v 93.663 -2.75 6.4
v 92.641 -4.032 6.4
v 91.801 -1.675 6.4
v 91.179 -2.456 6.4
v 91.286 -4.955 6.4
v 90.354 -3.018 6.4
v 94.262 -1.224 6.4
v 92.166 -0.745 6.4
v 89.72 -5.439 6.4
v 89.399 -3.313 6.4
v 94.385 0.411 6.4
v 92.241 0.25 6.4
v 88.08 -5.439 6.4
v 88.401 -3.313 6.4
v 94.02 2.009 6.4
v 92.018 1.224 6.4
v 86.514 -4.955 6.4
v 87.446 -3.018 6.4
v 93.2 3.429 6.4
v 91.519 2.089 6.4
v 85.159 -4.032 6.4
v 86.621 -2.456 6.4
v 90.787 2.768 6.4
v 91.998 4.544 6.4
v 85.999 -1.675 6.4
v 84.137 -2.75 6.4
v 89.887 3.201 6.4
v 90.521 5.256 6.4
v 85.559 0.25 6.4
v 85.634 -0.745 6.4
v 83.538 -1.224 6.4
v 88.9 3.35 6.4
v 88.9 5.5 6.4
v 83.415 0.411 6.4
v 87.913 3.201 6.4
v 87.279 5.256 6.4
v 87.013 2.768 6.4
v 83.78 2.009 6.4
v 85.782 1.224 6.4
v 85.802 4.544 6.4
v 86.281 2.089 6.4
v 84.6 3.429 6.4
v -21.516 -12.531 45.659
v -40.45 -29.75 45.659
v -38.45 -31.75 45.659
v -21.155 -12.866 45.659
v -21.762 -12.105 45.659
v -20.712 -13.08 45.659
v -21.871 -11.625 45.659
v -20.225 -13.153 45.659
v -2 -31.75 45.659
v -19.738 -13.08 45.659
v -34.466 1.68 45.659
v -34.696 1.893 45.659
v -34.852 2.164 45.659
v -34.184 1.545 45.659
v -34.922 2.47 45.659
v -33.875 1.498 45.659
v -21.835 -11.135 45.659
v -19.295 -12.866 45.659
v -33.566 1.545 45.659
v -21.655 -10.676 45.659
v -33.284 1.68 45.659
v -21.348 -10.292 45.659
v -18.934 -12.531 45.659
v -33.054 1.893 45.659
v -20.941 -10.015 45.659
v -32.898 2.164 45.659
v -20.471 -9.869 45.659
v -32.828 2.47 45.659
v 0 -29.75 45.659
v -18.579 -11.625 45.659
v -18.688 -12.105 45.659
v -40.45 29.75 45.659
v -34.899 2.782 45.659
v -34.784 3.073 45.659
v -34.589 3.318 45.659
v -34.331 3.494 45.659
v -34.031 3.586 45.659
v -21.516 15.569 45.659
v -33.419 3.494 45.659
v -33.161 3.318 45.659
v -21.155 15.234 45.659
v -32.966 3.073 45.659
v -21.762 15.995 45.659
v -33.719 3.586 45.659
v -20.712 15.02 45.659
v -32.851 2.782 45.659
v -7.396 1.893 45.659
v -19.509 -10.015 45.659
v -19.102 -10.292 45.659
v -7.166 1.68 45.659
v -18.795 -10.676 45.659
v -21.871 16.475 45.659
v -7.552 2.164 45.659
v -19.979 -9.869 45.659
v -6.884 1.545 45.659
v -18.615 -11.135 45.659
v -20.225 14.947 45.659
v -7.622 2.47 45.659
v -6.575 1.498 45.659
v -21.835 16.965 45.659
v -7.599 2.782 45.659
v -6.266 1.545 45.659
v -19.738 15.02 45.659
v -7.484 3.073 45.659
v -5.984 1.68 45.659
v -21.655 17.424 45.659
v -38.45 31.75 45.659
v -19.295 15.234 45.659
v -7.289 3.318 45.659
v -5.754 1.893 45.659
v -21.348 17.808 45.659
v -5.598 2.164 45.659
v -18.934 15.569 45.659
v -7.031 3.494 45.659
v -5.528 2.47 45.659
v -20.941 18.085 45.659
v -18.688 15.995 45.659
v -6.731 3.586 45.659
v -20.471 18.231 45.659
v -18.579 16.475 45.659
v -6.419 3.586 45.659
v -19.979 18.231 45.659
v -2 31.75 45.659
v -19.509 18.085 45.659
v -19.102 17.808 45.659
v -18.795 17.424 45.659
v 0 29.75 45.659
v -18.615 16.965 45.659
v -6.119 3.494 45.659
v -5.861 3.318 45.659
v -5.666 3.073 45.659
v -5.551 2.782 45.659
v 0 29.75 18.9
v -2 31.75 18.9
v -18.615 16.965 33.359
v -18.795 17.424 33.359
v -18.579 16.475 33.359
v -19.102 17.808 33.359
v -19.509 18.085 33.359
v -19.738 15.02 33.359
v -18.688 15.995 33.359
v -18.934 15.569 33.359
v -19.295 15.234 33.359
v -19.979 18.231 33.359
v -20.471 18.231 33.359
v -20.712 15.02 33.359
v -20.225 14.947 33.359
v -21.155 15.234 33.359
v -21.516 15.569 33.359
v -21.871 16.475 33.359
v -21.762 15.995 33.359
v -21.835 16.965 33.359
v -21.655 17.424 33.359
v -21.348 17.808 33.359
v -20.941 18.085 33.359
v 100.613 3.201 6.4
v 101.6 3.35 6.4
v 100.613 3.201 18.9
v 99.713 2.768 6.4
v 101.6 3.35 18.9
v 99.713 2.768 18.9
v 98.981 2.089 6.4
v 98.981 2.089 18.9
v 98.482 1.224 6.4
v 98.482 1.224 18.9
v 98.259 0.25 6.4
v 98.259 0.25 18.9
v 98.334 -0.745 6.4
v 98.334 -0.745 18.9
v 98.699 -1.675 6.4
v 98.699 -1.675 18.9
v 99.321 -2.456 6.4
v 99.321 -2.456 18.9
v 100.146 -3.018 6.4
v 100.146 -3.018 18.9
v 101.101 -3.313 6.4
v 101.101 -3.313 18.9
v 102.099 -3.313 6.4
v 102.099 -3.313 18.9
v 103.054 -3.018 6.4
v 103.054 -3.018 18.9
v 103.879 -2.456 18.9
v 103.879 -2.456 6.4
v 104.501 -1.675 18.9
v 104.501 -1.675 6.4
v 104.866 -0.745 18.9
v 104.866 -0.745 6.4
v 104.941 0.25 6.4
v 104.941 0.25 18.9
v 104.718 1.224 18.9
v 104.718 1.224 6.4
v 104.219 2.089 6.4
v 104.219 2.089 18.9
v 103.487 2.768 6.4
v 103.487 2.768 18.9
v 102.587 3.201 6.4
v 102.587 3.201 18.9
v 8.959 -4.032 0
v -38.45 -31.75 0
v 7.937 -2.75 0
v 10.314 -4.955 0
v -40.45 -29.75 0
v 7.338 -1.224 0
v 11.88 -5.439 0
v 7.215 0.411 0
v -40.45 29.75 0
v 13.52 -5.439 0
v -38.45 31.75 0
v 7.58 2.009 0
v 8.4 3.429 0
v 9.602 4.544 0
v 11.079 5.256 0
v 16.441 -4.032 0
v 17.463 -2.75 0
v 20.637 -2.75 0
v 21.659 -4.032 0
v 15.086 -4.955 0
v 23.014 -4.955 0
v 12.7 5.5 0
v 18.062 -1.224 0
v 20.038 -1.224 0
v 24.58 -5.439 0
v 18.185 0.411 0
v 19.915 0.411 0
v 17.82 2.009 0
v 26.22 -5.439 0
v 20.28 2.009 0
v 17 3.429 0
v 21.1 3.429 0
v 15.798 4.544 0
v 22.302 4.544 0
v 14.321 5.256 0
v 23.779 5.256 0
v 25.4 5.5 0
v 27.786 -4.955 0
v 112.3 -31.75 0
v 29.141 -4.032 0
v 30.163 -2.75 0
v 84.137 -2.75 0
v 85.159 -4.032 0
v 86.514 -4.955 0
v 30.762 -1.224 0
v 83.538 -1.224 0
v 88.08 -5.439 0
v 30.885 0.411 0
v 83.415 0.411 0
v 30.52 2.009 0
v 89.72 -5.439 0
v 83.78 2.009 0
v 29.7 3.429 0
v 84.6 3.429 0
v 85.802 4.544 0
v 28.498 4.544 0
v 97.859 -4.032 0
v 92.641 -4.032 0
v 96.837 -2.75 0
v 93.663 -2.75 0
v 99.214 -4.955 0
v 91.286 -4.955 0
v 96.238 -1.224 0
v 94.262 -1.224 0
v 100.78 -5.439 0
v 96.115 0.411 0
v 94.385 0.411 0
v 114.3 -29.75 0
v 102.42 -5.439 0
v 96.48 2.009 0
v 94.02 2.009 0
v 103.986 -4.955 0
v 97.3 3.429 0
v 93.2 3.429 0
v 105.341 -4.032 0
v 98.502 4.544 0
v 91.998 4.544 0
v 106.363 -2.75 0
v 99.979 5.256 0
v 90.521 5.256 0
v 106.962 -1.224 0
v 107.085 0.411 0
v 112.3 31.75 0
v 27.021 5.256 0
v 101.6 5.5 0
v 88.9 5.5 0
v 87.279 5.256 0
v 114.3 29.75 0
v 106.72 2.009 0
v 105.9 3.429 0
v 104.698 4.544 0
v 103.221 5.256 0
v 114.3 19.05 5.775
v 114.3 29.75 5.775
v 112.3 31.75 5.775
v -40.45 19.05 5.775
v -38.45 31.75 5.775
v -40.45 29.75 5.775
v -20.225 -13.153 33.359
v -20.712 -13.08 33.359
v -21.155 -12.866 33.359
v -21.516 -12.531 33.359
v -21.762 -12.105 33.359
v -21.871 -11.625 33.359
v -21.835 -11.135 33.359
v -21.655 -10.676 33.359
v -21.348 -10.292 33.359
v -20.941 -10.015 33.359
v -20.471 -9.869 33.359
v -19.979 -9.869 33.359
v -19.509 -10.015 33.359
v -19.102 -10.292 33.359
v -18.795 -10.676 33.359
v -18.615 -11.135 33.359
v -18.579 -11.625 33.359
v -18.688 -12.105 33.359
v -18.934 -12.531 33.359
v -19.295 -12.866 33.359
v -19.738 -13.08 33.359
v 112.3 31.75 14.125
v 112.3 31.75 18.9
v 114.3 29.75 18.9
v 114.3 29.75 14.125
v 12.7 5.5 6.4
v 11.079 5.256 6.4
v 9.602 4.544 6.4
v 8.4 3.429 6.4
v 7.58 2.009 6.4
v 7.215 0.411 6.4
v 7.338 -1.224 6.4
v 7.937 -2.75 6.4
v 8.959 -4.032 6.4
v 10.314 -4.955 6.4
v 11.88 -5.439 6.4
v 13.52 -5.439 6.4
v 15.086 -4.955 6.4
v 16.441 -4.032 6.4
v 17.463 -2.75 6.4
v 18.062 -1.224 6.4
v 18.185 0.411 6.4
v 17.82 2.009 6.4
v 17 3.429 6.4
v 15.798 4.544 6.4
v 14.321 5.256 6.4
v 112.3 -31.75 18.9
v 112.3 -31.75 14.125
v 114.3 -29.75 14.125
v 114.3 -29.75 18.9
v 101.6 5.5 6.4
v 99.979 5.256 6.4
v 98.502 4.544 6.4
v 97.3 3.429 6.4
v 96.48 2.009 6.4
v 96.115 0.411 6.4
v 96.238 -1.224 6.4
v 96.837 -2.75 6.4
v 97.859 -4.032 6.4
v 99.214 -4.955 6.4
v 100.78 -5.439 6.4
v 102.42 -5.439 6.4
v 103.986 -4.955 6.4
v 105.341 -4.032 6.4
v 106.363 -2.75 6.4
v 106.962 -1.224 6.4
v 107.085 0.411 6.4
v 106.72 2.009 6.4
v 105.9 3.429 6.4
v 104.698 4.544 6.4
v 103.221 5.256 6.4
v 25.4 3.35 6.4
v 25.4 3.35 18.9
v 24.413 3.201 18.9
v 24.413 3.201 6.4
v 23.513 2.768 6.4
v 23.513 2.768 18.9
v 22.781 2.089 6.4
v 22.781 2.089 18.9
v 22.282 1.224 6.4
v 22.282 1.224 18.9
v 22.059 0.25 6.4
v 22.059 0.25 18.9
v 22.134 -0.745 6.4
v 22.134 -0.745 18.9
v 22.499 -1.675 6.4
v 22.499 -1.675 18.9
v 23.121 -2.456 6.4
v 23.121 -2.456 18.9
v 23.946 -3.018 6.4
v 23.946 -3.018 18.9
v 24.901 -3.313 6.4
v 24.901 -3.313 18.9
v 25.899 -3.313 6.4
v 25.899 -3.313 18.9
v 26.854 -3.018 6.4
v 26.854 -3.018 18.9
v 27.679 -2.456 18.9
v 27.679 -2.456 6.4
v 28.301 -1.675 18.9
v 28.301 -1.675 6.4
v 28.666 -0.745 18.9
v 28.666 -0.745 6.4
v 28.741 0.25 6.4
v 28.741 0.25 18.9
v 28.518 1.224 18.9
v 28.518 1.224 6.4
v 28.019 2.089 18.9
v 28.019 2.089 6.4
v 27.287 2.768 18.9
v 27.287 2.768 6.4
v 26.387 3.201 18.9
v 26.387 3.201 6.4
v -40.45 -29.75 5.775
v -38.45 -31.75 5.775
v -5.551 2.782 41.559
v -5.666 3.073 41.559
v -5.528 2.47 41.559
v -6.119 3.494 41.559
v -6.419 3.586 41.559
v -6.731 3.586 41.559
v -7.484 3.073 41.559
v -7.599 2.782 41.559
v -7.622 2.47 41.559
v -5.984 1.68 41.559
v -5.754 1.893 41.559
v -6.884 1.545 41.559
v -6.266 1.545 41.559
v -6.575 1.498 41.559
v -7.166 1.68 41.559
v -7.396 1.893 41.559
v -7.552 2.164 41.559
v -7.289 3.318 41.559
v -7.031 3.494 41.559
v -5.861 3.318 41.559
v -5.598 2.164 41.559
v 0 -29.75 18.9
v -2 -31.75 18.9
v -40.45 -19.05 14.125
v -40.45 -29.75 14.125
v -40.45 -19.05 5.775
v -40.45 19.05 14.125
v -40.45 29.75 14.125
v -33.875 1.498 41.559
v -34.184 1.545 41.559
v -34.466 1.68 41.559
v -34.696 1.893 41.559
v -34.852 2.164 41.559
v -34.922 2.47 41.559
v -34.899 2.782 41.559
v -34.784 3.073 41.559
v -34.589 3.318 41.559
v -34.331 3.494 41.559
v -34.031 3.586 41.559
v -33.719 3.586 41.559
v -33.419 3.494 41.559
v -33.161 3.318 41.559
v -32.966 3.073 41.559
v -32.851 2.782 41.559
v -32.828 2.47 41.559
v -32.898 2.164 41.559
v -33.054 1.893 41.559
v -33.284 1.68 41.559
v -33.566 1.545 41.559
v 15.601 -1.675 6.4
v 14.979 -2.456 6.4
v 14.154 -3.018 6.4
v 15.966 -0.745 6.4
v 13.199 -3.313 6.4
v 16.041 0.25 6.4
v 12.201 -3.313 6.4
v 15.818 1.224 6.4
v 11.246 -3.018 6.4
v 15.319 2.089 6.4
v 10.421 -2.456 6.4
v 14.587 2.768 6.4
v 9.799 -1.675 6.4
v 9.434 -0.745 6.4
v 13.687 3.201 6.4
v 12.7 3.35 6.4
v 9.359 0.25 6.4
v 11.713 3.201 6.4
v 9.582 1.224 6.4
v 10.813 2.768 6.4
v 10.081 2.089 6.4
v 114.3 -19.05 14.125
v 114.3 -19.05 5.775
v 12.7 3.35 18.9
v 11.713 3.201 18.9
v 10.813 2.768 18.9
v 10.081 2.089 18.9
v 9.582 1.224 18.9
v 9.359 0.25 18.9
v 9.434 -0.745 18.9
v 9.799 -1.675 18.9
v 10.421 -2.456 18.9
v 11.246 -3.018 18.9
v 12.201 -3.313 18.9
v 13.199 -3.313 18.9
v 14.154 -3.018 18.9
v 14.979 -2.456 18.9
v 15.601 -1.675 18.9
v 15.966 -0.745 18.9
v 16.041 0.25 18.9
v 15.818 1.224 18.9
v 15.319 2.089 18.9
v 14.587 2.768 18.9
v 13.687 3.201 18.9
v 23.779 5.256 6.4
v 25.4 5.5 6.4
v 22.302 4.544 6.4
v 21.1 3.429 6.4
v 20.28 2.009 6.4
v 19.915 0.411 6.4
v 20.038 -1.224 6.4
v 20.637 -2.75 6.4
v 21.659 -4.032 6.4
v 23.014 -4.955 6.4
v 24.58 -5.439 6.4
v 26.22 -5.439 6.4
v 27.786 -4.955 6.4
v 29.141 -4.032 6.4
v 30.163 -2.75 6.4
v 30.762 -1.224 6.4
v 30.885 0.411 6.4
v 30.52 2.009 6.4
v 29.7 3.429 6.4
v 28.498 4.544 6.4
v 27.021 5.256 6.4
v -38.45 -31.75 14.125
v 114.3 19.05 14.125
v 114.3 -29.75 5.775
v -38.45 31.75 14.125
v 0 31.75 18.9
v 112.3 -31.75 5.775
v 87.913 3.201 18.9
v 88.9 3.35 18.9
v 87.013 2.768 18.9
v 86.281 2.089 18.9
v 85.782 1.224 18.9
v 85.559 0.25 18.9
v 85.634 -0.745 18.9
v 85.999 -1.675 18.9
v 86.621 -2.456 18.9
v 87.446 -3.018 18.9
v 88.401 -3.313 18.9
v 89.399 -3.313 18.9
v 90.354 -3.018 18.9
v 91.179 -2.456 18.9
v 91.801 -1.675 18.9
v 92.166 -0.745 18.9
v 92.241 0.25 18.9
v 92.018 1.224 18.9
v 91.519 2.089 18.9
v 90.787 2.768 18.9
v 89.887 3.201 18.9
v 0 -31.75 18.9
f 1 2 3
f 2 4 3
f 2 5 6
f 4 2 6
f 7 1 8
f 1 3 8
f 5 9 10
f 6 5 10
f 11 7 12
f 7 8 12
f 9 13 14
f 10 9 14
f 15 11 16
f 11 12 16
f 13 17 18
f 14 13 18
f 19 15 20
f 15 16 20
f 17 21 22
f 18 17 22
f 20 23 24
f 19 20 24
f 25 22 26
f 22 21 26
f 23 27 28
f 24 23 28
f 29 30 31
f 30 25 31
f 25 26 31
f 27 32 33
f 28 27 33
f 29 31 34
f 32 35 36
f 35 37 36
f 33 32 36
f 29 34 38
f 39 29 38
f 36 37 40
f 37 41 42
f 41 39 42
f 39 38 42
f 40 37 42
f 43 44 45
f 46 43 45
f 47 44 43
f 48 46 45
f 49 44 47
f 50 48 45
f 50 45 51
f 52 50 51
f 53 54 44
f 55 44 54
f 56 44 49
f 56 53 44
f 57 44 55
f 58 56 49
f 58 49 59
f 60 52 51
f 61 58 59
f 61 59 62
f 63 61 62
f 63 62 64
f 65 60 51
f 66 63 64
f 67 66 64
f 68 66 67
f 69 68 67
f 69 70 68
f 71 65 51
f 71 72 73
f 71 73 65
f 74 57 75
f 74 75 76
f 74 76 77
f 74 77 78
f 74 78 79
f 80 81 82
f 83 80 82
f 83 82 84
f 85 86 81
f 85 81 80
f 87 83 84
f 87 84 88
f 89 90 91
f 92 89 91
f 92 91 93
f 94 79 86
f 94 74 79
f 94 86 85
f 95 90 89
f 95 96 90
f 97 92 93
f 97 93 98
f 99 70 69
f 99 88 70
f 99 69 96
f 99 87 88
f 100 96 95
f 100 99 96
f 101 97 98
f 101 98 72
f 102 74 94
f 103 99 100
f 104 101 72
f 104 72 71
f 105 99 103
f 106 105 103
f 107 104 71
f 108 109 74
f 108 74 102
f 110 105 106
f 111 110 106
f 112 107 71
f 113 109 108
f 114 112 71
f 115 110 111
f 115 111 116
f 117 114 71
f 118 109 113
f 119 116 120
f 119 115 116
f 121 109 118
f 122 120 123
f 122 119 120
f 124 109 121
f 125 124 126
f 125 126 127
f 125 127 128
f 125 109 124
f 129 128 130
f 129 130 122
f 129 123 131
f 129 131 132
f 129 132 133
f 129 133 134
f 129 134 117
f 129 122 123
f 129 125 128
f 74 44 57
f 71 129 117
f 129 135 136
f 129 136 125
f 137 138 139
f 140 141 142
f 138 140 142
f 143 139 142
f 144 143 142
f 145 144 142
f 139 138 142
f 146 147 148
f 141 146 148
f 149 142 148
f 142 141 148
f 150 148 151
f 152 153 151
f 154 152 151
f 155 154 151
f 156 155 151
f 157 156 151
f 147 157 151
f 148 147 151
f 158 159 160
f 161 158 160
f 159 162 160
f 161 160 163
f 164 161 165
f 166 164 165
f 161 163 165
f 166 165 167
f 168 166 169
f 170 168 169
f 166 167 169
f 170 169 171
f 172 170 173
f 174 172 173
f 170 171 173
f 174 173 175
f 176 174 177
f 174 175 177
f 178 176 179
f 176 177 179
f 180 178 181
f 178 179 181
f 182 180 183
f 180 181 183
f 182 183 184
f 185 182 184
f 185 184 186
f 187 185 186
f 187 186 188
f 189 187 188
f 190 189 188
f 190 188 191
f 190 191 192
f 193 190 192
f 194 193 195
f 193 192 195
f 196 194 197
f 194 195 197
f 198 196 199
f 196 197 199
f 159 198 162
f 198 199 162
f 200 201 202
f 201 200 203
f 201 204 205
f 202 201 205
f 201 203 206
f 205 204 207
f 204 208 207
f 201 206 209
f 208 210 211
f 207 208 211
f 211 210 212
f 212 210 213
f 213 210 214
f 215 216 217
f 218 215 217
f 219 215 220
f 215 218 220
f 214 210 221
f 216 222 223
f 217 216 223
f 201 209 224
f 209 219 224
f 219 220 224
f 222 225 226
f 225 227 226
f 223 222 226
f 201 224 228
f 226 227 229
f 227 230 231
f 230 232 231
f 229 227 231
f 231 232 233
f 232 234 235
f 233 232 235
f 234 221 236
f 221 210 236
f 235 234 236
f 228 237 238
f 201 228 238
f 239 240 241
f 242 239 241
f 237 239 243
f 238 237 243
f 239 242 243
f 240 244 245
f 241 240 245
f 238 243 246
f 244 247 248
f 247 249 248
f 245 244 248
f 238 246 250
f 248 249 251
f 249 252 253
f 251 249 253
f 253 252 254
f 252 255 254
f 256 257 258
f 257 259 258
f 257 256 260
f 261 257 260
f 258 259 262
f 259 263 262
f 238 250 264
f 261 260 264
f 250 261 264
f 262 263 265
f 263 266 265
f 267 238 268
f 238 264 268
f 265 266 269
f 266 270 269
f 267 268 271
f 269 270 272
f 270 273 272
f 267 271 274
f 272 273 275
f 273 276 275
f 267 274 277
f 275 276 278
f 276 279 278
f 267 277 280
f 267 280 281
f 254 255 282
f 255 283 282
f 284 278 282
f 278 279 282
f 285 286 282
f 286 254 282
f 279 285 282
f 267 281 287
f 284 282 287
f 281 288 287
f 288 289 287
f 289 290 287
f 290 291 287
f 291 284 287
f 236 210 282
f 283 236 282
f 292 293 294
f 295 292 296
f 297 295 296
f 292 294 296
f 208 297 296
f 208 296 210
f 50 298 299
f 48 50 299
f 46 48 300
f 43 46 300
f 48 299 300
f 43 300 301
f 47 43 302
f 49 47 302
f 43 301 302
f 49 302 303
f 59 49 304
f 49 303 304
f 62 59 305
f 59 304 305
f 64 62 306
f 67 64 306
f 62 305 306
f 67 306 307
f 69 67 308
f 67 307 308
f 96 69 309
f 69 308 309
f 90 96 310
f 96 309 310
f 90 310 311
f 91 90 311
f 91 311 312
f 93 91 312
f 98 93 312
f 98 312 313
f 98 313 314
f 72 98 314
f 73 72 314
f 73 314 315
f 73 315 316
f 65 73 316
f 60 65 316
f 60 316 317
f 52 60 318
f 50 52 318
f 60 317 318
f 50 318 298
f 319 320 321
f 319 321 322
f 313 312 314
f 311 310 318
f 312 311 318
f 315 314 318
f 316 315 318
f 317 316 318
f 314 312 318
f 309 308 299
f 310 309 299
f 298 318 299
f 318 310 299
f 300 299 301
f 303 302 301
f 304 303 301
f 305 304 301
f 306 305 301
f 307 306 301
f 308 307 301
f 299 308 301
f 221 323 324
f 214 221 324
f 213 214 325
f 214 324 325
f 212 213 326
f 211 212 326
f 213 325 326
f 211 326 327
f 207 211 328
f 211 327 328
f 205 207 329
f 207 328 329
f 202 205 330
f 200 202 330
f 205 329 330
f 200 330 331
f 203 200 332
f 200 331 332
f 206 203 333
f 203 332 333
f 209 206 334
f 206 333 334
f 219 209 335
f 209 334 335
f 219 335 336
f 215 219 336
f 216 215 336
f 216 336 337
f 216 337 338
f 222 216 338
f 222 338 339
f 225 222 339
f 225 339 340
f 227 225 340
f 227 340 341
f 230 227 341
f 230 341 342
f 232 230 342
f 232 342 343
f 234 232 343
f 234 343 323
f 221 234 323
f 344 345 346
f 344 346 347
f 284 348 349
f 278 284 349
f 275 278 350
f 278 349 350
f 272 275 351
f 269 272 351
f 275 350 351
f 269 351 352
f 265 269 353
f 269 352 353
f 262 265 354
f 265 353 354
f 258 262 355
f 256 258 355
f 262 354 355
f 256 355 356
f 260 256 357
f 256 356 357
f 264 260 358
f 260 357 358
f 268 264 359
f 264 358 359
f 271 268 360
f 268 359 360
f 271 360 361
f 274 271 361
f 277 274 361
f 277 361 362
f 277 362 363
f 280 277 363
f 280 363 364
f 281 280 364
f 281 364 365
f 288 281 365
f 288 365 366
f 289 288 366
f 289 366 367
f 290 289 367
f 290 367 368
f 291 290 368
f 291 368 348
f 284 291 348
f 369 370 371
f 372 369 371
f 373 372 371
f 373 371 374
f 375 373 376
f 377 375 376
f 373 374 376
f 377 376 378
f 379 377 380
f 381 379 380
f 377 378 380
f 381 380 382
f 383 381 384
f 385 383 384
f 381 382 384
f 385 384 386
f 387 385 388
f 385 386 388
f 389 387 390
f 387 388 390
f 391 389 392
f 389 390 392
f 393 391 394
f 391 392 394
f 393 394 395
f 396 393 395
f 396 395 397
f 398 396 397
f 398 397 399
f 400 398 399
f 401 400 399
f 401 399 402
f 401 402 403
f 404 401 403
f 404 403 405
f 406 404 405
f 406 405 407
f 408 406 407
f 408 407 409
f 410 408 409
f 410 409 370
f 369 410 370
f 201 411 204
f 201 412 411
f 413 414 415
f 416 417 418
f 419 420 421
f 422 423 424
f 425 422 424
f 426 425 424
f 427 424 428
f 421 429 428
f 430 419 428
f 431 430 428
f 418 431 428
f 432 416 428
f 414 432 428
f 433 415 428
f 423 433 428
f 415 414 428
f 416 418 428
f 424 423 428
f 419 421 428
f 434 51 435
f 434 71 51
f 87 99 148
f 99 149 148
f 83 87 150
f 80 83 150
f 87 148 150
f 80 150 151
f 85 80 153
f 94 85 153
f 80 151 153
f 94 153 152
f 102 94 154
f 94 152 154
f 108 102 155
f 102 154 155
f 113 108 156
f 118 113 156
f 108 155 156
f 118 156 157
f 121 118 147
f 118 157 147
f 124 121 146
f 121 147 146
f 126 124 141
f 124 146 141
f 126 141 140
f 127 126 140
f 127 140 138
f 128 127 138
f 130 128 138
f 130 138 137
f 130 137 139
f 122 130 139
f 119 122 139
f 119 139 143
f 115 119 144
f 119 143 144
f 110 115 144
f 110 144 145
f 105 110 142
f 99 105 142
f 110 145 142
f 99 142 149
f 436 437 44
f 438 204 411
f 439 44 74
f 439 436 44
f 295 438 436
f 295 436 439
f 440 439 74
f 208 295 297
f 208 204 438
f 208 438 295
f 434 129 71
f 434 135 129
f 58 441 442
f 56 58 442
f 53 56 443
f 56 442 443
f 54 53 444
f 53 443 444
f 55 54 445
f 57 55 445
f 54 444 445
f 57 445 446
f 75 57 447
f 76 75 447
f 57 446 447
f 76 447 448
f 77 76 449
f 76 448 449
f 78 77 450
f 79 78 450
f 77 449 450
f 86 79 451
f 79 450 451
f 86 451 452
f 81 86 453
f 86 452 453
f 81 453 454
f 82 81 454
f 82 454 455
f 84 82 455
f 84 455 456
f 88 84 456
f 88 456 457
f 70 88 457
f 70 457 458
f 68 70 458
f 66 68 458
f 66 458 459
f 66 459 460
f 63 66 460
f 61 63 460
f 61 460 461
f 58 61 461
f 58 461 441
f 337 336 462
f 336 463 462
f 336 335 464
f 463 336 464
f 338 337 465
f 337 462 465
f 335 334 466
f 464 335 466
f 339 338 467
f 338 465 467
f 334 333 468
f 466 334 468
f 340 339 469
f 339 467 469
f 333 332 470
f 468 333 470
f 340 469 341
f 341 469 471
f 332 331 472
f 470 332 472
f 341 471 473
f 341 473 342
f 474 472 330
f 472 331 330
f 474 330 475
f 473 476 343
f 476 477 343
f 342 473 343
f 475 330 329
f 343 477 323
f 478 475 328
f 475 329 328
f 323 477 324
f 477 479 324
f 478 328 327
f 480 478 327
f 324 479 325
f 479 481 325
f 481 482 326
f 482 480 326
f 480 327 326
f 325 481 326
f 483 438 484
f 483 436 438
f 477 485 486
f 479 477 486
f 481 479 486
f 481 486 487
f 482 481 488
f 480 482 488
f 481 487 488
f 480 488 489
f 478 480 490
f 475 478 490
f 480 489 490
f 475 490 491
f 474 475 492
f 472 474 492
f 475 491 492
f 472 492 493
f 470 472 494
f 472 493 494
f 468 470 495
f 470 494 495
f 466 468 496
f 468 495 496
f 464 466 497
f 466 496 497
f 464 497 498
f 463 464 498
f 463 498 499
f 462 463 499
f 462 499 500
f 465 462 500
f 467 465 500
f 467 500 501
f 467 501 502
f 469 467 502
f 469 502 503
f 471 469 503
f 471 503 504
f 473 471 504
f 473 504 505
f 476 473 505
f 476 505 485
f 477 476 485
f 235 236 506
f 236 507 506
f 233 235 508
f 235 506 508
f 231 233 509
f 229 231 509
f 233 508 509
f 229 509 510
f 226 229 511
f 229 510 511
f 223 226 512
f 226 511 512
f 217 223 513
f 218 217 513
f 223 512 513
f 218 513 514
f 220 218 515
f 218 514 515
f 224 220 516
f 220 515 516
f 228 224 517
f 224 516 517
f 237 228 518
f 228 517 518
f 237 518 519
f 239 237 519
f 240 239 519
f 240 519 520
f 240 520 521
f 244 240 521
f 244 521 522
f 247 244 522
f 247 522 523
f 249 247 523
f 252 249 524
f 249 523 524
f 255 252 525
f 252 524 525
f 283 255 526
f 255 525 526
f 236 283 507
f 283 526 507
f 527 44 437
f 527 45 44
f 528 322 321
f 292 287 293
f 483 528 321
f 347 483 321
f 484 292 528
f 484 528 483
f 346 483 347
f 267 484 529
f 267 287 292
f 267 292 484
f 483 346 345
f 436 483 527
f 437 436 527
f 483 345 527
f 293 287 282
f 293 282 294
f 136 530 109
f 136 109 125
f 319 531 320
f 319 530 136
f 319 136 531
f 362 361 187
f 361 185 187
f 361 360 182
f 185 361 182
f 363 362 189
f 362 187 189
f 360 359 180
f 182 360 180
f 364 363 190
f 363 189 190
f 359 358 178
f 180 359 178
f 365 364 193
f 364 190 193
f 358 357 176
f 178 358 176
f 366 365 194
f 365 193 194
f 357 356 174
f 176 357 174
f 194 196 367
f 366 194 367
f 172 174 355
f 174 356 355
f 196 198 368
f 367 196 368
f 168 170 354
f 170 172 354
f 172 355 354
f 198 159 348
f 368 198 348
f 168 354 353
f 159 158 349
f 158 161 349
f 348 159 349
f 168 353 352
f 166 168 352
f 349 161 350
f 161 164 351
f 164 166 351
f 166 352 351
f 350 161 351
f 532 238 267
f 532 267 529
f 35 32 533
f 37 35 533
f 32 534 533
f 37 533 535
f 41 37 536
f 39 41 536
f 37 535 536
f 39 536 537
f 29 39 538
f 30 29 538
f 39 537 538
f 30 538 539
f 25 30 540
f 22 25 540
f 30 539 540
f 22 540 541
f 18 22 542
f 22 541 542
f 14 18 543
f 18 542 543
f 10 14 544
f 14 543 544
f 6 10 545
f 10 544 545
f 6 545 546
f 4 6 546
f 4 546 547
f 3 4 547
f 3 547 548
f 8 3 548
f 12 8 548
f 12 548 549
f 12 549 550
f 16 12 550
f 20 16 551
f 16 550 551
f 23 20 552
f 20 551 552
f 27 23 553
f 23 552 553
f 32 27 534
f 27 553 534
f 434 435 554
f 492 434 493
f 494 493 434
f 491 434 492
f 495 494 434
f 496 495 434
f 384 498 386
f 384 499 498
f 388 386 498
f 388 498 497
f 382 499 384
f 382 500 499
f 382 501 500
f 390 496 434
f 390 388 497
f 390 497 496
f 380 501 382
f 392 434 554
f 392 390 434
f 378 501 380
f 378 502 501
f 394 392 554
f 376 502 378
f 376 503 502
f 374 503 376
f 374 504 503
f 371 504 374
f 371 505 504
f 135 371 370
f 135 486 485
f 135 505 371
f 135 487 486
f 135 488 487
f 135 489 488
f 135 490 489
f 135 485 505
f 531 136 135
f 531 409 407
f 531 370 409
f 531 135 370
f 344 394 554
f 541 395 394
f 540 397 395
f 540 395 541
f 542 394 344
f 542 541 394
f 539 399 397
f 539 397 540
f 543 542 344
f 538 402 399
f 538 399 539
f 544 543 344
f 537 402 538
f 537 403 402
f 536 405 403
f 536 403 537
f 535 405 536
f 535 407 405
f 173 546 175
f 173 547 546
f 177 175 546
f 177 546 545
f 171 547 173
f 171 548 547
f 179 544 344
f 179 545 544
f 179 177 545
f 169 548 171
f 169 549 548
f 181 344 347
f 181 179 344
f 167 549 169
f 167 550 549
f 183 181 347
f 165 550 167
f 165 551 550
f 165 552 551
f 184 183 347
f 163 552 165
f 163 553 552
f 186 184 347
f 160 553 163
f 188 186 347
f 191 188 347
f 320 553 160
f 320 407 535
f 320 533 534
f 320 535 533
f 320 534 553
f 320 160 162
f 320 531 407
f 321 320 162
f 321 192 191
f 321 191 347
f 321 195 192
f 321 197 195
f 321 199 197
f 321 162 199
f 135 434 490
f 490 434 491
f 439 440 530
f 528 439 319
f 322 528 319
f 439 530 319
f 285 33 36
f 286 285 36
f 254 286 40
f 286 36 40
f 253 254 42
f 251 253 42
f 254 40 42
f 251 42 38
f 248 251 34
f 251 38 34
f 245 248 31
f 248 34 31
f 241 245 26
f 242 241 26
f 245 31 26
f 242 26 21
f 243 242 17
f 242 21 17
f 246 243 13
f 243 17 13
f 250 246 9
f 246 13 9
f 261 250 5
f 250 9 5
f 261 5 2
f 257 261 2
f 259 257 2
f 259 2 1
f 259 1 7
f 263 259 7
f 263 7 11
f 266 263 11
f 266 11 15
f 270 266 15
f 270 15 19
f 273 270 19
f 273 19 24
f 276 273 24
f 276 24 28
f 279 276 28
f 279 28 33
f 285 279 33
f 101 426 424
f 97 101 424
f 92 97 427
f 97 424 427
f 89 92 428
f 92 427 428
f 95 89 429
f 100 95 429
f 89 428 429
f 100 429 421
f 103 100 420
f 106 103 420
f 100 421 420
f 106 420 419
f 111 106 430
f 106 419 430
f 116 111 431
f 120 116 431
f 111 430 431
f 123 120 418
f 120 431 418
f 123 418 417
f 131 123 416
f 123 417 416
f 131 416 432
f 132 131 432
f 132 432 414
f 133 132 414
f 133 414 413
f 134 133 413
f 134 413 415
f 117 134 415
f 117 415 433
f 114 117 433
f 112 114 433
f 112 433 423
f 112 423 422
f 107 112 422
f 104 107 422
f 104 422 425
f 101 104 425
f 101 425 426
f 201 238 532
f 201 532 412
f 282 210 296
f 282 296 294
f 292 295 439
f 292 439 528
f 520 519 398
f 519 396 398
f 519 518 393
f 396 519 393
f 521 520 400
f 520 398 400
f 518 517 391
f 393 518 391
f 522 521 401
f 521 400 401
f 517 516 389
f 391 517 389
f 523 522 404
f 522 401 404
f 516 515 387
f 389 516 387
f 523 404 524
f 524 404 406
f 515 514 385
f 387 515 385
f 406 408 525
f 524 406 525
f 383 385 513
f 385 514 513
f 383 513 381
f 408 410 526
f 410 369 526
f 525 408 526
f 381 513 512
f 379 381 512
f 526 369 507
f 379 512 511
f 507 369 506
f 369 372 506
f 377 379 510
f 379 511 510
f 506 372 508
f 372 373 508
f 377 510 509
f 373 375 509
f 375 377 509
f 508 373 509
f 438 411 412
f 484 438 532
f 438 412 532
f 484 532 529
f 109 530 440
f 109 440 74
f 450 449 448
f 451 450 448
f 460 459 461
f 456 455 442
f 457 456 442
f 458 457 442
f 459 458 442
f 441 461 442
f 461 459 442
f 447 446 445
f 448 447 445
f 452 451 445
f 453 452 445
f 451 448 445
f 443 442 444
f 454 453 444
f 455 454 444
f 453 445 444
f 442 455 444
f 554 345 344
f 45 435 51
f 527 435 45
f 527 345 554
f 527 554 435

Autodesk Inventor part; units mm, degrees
ref_plane "YZ Plane" through (0, 0, 0) normal (1, 0, 0) x (0, 1, 0)
ref_plane "XZ Plane" through (0, 0, 0) normal (0, 1, 0) x (-1, 0, 0)
ref_plane "XY Plane" through (0, 0, 0) normal (0, 0, 1) x (1, 0, 0)
sketch "Sketch1" plane through (0, 0, 0) normal (0, 0, 1) x (1, 0, 0)
  line L0 (-40.45, 31.75) -> (114.3, 31.75)
  line L1 (114.3, 31.75) -> (114.3, -31.75)
  line L2 (114.3, -31.75) -> (-40.45, -31.75)
  line L3 (-40.45, -31.75) -> (-40.45, 31.75)
  point P0 (0, 0)
  dimension "d0" = 63.5
  dimension "d1" = 31.75
  dimension "d2" = 40.45
  dimension "LENGTH" = 154.75
extrude "Extrusion1" add sketch "Sketch1" along normal blind 18.9
sketch "Sketch2" plane through (0, 0, 18.9) normal (0, 0, 1) x (1, 0, 0)
  line L0 (114.3, 31.75) -> (-40.45, 31.75) projected
  line L1 (-40.45, -31.75) -> (114.3, -31.75) projected
  line L2 (-40.45, 31.75) -> (0, 31.75)
  line L3 (0, 31.75) -> (0, -31.75)
  line L4 (0, -31.75) -> (-40.45, -31.75)
  line L5 (-40.45, -31.75) -> (-40.45, 31.75)
  point P0 (0, 0)
  dimension "d6" = 40.45
extrude "Extrusion2" add sketch "Sketch2" along normal blind 26.759
sketch "Sketch3" plane through (0, 0, 0) normal (0, 0, 1) x (1, 0, 0)
  line L0 (114.3, -31.75) -> (114.3, 31.75) projected
  point P0 (0, 0)
  point P1 (12.7, 0)
  point P2 (25.4, 0)
  point P3 (88.9, 0)
  point P4 (101.6, 0)
  dimension "d9" = 0
  dimension "d10" = 0
  dimension "d11" = 0
  dimension "d12" = 0
  dimension "d13" = 88.9
  dimension "d14" = 12.7
  dimension "d15" = 63.5
  dimension "d16" = 12.7
hole "Hole2" at (12.7, 0, 0) at (101.6, 0, 0) at (25.4, 0, 0) at (88.9, 0, 0) direction (0, 0, 1) diameter 6.7 end through all counterbore diameter 11 counterbore depth 6.4 clearance for "Socket Head Cap Screw" size "1/4" standard "Ansi Unified Screw Threads"
sketch "Sketch4" plane through (-40.45, -31.75, 0) normal (0, -1, 0) x (1, 0, 0)
  line L0 (0, 5.775) -> (154.75, 5.775)
  line L1 (154.75, 5.775) -> (154.75, 14.125)
  line L2 (154.75, 14.125) -> (0, 14.125)
  line L3 (0, 14.125) -> (0, 5.775)
  line L4 (0, 5.775) -> (154.75, 14.125) construction
  line L5 (154.75, 5.775) -> (0, 14.125) construction
  line L6 (0, 0) -> (0, 45.659) projected
  line L7 (0, 0) -> (154.75, 0) projected
  point P0 (40.45, 0)
  point P1 (77.375, 9.95)
  dimension "d31" = 154.75
  dimension "d32" = 77.375
  dimension "d33" = 9.95
  dimension "SLOT_HEIGHT" = 8.35
sketch "Sketch5" plane through (-40.45, 31.75, 0) normal (0, 1, 0) x (1, 0, 0)
  line L0 (154.75, -5.775) -> (0, -5.775)
  line L1 (0, -5.775) -> (0, -14.125)
  line L2 (0, -14.125) -> (154.75, -14.125)
  line L3 (154.75, -14.125) -> (154.75, -5.775)
  line L4 (154.75, -5.775) -> (0, -14.125) construction
  line L5 (0, -5.775) -> (154.75, -14.125) construction
  line L6 (0, 0) -> (0, -45.659) projected
  point P0 (40.45, 0)
  point P1 (77.375, -9.95)
  dimension "d35" = 8.35
  dimension "d36" = 154.75
  dimension "d37" = 0
  dimension "d38" = 9.95
extrude "Extrusion3" cut sketch "Sketch5" against normal blind 12.7
extrude "Extrusion4" cut sketch "Sketch4" against normal blind 12.7
sketch "Sketch6" plane through (0, 0, 45.659) normal (0, 0, 1) x (1, 0, 0)
  line L0 (0, 31.75) -> (-40.45, 31.75) projected
  line L1 (-40.45, -31.75) -> (0, -31.75) projected
  line L2 (-40.45, 31.75) -> (-40.45, -31.75) projected
  line L3 (-6.575, 2.048) -> (-6.575, 3.048) construction
  line L4 (-5.525, 2.048) -> (-5.525, 3.048)
  line L5 (-7.625, 3.048) -> (-7.625, 2.048)
  arc A0 (-7.625, 2.048) -> (-5.525, 2.048) centre (-6.575, 2.048) ccw
  arc A1 (-5.525, 3.048) -> (-7.625, 3.048) centre (-6.575, 3.048) ccw
  point P0 (0, 0)
  point P1 (-20.225, -11.502)
  point P2 (-20.225, 16.598)
  point P3 (-33.875, 2.548)
  point P4 (-6.575, 2.548)
  dimension "d43" = 0
  dimension "d44" = 15.152
  dimension "d45" = 0
  dimension "d46" = 20.248
  dimension "d47" = 20.225
  dimension "d48" = 28.1
  dimension "d50" = 27.3
  dimension "d51" = 14.05
  dimension "d52" = 13.65
  dimension "d67" = 1.05
  dimension "d68" = 1
hole "Hole3" at (-33.875, 2.548, 45.659) at (-6.575, 2.548, 45.659) direction (0, 0, -1) diameter 2.1 depth 4.1
hole "Hole4" at (-20.225, -11.502, 45.659) at (-20.225, 16.598, 45.659) direction (0, 0, -1) diameter 3.302 depth 12.3 thread size "8-32 UNC" class "2B" standard "ANSI Unified Screw Threads"
chamfer "Chamfer1" [suppressed]
chamfer "Chamfer2" distance 2 angle 45 10 edges at (0, -31.75, 32.2795) (-40.45, -31.75, 29.892) (-40.45, -31.75, 2.8875) (114.3, -31.75, 16.5125) (114.3, -31.75, 2.8875) (114.3, 31.75, 16.5125) (114.3, 31.75, 2.8875) (0, 31.75, 32.2795) (-40.45, 31.75, 29.892) (-40.45, 31.75, 2.8875)
equation "\"d0\" = WIDTH"
equation "\"d1\" = 0.5 * WIDTH"
equation "\"d2\" = APP_LENGTH"
equation "\"LENGTH\" = APP_LENGTH + ISOLATOR_MT_LENGTH"
equation "\"d6\" = APP_LENGTH"
equation "\"d7\" = APP_HEIGHT"
equation "\"d31\" = LENGTH"
equation "\"d32\" = 0.5 * LENGTH"
equation "\"d33\" = 0.5 * ISOLATOR_HEIGHT"
equation "\"d35\" = SLOT_HEIGHT"
equation "\"d36\" = LENGTH"
equation "\"d38\" = 0.5 * ISOLATOR_HEIGHT"
equation "\"d41\" = SLOT_DEPTH"
equation "\"d51\" = 0.5 * d48"
equation "\"d52\" = 0.5 * d50"
equation "\"ISOLATOR_MT_LENGTH\" = 114.3"
equation "\"WIDTH\" = 63.5"
equation "\"ISOLATOR_HEIGHT\" = 19.9"
equation "\"APP_LENGTH\" = 40.45"
equation "\"APP_HEIGHT\" = 26.759"
equation "\"SLOT_DEPTH\" = 12.7"
properties part number "711C-1-APP-mount"
